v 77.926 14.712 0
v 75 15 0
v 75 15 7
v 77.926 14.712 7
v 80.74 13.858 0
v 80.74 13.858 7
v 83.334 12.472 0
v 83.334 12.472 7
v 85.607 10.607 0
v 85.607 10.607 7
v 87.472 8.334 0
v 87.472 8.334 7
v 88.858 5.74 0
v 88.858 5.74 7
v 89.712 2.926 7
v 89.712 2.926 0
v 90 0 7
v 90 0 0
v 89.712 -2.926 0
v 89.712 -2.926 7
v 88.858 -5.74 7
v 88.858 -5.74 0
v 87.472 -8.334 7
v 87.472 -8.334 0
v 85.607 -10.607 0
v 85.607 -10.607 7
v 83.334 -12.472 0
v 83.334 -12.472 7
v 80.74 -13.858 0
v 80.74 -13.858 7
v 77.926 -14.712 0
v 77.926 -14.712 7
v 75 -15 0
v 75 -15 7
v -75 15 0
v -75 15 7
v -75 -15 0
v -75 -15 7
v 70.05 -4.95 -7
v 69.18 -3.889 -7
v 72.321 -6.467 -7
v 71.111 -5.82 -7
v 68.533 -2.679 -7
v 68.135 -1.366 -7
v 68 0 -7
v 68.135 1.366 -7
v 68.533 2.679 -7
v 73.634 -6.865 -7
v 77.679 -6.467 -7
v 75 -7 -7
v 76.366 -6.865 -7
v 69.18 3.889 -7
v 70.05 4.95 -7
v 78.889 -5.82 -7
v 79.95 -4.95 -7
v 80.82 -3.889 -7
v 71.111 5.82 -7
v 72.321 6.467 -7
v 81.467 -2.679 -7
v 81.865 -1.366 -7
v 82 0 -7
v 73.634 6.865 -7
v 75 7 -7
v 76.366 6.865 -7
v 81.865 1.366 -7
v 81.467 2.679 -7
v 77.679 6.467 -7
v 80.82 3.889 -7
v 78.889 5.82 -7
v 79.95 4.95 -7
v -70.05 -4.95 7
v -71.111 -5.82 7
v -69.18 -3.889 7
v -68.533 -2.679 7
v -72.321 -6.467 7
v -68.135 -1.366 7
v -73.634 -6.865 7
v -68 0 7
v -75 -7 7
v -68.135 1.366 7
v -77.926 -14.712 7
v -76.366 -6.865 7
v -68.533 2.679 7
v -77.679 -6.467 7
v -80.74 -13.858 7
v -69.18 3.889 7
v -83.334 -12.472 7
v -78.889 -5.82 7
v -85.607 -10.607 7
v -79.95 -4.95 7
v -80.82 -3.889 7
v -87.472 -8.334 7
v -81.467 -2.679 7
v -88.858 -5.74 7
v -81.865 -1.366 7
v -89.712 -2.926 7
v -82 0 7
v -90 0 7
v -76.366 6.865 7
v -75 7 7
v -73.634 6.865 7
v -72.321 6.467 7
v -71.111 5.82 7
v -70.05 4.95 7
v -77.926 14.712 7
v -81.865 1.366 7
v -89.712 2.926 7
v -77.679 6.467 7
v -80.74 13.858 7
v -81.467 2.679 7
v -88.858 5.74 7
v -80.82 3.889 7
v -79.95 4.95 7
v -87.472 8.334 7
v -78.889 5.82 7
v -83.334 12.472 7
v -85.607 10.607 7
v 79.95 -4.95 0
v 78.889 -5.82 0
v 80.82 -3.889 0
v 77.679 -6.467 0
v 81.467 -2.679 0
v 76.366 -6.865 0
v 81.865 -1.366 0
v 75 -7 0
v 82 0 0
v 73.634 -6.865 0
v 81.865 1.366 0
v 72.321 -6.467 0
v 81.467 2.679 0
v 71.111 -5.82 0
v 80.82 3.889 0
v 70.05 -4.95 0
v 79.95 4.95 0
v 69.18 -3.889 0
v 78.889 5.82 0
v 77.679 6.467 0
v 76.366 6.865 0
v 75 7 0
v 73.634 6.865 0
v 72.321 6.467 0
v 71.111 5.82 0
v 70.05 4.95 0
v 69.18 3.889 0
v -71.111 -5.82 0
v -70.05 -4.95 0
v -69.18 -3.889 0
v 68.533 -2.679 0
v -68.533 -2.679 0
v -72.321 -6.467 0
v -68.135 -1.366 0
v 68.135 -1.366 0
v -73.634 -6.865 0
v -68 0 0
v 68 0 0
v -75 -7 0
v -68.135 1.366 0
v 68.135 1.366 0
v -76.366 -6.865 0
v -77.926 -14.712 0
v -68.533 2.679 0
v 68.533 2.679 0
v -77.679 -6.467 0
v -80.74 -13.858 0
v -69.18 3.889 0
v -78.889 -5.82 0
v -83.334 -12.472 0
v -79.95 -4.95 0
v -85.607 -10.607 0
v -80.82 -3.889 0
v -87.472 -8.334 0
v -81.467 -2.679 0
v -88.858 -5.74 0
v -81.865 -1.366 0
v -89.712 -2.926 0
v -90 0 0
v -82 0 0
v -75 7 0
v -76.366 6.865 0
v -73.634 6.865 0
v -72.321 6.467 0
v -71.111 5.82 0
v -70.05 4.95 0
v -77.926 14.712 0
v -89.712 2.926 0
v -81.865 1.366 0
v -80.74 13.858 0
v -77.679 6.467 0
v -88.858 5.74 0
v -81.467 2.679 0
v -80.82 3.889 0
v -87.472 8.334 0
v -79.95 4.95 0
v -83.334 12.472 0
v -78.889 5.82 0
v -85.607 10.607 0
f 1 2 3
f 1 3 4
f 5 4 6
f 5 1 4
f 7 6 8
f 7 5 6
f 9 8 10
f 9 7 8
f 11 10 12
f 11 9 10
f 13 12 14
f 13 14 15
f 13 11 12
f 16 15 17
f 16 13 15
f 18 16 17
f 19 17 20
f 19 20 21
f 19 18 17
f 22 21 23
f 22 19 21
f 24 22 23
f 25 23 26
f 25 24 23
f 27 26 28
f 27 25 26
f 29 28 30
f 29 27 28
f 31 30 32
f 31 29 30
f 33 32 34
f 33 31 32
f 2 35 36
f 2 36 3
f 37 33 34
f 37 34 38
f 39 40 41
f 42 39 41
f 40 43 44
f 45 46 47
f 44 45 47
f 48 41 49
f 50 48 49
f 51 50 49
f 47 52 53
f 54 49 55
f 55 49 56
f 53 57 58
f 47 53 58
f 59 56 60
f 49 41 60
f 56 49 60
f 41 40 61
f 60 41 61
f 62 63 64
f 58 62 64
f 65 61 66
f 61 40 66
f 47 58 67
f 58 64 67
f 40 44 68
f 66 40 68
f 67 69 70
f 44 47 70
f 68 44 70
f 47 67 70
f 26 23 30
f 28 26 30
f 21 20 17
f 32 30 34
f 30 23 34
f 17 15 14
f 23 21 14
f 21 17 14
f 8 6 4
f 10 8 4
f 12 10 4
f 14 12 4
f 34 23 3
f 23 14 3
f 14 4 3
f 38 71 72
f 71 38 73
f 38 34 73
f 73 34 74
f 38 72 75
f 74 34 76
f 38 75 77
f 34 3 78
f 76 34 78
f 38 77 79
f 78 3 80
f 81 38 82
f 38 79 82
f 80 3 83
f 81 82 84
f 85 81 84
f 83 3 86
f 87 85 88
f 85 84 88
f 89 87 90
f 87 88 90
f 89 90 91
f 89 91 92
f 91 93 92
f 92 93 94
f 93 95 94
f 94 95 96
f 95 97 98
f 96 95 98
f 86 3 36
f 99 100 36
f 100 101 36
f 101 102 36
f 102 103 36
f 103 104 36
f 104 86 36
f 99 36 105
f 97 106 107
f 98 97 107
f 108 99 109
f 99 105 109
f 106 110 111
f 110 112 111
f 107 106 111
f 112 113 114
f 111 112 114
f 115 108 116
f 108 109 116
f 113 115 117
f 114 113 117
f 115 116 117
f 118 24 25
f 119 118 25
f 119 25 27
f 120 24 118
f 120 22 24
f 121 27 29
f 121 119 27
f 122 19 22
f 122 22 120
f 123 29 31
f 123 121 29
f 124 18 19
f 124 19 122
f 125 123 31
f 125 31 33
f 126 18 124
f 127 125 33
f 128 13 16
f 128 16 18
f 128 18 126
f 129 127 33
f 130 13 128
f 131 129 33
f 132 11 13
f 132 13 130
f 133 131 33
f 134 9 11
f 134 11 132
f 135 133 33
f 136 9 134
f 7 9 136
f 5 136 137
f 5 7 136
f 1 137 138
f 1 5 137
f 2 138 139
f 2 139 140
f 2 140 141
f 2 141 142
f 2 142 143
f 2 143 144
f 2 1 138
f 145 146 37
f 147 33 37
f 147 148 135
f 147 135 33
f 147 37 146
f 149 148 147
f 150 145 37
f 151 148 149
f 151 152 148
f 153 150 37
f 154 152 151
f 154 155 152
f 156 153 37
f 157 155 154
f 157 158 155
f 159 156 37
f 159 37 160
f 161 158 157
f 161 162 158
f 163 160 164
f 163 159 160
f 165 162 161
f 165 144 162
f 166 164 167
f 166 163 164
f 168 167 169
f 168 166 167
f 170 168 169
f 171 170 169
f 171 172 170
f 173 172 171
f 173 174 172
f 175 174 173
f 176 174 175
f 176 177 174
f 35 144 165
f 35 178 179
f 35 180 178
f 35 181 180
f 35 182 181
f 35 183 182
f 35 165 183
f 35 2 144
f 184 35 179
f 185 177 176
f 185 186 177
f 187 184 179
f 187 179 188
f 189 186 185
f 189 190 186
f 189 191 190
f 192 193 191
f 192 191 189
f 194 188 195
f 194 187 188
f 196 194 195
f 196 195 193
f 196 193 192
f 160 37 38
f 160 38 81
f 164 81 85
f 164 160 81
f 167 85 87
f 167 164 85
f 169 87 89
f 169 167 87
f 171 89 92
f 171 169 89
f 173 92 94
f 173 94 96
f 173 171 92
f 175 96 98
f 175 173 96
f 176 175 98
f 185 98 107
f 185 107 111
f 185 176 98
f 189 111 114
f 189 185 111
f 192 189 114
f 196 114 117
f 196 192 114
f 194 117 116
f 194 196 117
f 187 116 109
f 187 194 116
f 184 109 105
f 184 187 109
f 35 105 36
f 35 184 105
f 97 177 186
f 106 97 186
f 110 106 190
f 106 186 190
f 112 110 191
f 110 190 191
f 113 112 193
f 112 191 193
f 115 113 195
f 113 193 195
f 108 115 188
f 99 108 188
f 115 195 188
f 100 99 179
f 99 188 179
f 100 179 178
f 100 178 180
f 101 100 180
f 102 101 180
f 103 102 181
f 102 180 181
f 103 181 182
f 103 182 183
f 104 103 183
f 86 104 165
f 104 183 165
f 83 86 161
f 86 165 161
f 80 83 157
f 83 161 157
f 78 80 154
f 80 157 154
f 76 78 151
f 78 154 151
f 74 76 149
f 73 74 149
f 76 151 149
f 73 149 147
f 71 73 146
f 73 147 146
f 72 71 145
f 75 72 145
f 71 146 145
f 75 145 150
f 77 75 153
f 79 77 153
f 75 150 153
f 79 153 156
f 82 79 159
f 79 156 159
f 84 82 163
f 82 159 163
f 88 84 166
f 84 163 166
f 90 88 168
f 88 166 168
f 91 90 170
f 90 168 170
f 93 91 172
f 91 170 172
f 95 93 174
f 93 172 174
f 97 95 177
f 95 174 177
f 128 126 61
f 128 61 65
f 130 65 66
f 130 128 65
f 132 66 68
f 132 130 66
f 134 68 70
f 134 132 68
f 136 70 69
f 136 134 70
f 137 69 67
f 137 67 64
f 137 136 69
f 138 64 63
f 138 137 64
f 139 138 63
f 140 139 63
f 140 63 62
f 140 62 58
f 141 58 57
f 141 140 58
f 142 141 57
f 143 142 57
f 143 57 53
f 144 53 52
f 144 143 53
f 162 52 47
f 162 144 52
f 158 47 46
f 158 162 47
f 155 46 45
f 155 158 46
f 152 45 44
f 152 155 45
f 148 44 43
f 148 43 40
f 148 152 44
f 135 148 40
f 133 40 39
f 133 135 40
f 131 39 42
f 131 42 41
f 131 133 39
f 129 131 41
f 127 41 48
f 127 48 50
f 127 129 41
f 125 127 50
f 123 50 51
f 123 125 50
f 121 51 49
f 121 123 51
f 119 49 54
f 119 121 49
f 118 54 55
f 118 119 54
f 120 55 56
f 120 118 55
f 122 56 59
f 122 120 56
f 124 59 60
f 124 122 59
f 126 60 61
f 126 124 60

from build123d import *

# Parameters (mm, degrees)
BOSS_EXTRUDE1_DEPTH = 7
SKETCH2_R           = 7
BOSS_EXTRUDE3_DEPTH = 7
SKETCH3_R           = 7
CUT_EXTRUDE1_DEPTH  = 7


with BuildPart() as part:
    # Sketch1 → Boss-Extrude1 (new body)
    with BuildSketch(Plane.XY):
        with BuildLine():
            Line((-75, 15), (75, 15))
            ThreePointArc((75, 15), (90, 0), (75, -15))
            Line((75, -15), (-75, -15))
            ThreePointArc((-75, -15), (-90, 0), (-75, 15))
        make_face()
    extrude(amount=BOSS_EXTRUDE1_DEPTH)

    # Sketch2 → Boss-Extrude3 (add)
    with BuildSketch(Plane.XY):
        with Locations((75, 0)):
            Circle(SKETCH2_R)
    extrude(amount=-BOSS_EXTRUDE3_DEPTH)

    # Sketch3 → Cut-Extrude1 (cut)
    with BuildSketch(Plane(origin=(0, 0, 0), x_dir=(-1, 0, 0), z_dir=(0, 0, -1))):
        with Locations((75, 0)):
            Circle(SKETCH3_R)
    extrude(amount=-CUT_EXTRUDE1_DEPTH, mode=Mode.SUBTRACT)


solid = part.part
